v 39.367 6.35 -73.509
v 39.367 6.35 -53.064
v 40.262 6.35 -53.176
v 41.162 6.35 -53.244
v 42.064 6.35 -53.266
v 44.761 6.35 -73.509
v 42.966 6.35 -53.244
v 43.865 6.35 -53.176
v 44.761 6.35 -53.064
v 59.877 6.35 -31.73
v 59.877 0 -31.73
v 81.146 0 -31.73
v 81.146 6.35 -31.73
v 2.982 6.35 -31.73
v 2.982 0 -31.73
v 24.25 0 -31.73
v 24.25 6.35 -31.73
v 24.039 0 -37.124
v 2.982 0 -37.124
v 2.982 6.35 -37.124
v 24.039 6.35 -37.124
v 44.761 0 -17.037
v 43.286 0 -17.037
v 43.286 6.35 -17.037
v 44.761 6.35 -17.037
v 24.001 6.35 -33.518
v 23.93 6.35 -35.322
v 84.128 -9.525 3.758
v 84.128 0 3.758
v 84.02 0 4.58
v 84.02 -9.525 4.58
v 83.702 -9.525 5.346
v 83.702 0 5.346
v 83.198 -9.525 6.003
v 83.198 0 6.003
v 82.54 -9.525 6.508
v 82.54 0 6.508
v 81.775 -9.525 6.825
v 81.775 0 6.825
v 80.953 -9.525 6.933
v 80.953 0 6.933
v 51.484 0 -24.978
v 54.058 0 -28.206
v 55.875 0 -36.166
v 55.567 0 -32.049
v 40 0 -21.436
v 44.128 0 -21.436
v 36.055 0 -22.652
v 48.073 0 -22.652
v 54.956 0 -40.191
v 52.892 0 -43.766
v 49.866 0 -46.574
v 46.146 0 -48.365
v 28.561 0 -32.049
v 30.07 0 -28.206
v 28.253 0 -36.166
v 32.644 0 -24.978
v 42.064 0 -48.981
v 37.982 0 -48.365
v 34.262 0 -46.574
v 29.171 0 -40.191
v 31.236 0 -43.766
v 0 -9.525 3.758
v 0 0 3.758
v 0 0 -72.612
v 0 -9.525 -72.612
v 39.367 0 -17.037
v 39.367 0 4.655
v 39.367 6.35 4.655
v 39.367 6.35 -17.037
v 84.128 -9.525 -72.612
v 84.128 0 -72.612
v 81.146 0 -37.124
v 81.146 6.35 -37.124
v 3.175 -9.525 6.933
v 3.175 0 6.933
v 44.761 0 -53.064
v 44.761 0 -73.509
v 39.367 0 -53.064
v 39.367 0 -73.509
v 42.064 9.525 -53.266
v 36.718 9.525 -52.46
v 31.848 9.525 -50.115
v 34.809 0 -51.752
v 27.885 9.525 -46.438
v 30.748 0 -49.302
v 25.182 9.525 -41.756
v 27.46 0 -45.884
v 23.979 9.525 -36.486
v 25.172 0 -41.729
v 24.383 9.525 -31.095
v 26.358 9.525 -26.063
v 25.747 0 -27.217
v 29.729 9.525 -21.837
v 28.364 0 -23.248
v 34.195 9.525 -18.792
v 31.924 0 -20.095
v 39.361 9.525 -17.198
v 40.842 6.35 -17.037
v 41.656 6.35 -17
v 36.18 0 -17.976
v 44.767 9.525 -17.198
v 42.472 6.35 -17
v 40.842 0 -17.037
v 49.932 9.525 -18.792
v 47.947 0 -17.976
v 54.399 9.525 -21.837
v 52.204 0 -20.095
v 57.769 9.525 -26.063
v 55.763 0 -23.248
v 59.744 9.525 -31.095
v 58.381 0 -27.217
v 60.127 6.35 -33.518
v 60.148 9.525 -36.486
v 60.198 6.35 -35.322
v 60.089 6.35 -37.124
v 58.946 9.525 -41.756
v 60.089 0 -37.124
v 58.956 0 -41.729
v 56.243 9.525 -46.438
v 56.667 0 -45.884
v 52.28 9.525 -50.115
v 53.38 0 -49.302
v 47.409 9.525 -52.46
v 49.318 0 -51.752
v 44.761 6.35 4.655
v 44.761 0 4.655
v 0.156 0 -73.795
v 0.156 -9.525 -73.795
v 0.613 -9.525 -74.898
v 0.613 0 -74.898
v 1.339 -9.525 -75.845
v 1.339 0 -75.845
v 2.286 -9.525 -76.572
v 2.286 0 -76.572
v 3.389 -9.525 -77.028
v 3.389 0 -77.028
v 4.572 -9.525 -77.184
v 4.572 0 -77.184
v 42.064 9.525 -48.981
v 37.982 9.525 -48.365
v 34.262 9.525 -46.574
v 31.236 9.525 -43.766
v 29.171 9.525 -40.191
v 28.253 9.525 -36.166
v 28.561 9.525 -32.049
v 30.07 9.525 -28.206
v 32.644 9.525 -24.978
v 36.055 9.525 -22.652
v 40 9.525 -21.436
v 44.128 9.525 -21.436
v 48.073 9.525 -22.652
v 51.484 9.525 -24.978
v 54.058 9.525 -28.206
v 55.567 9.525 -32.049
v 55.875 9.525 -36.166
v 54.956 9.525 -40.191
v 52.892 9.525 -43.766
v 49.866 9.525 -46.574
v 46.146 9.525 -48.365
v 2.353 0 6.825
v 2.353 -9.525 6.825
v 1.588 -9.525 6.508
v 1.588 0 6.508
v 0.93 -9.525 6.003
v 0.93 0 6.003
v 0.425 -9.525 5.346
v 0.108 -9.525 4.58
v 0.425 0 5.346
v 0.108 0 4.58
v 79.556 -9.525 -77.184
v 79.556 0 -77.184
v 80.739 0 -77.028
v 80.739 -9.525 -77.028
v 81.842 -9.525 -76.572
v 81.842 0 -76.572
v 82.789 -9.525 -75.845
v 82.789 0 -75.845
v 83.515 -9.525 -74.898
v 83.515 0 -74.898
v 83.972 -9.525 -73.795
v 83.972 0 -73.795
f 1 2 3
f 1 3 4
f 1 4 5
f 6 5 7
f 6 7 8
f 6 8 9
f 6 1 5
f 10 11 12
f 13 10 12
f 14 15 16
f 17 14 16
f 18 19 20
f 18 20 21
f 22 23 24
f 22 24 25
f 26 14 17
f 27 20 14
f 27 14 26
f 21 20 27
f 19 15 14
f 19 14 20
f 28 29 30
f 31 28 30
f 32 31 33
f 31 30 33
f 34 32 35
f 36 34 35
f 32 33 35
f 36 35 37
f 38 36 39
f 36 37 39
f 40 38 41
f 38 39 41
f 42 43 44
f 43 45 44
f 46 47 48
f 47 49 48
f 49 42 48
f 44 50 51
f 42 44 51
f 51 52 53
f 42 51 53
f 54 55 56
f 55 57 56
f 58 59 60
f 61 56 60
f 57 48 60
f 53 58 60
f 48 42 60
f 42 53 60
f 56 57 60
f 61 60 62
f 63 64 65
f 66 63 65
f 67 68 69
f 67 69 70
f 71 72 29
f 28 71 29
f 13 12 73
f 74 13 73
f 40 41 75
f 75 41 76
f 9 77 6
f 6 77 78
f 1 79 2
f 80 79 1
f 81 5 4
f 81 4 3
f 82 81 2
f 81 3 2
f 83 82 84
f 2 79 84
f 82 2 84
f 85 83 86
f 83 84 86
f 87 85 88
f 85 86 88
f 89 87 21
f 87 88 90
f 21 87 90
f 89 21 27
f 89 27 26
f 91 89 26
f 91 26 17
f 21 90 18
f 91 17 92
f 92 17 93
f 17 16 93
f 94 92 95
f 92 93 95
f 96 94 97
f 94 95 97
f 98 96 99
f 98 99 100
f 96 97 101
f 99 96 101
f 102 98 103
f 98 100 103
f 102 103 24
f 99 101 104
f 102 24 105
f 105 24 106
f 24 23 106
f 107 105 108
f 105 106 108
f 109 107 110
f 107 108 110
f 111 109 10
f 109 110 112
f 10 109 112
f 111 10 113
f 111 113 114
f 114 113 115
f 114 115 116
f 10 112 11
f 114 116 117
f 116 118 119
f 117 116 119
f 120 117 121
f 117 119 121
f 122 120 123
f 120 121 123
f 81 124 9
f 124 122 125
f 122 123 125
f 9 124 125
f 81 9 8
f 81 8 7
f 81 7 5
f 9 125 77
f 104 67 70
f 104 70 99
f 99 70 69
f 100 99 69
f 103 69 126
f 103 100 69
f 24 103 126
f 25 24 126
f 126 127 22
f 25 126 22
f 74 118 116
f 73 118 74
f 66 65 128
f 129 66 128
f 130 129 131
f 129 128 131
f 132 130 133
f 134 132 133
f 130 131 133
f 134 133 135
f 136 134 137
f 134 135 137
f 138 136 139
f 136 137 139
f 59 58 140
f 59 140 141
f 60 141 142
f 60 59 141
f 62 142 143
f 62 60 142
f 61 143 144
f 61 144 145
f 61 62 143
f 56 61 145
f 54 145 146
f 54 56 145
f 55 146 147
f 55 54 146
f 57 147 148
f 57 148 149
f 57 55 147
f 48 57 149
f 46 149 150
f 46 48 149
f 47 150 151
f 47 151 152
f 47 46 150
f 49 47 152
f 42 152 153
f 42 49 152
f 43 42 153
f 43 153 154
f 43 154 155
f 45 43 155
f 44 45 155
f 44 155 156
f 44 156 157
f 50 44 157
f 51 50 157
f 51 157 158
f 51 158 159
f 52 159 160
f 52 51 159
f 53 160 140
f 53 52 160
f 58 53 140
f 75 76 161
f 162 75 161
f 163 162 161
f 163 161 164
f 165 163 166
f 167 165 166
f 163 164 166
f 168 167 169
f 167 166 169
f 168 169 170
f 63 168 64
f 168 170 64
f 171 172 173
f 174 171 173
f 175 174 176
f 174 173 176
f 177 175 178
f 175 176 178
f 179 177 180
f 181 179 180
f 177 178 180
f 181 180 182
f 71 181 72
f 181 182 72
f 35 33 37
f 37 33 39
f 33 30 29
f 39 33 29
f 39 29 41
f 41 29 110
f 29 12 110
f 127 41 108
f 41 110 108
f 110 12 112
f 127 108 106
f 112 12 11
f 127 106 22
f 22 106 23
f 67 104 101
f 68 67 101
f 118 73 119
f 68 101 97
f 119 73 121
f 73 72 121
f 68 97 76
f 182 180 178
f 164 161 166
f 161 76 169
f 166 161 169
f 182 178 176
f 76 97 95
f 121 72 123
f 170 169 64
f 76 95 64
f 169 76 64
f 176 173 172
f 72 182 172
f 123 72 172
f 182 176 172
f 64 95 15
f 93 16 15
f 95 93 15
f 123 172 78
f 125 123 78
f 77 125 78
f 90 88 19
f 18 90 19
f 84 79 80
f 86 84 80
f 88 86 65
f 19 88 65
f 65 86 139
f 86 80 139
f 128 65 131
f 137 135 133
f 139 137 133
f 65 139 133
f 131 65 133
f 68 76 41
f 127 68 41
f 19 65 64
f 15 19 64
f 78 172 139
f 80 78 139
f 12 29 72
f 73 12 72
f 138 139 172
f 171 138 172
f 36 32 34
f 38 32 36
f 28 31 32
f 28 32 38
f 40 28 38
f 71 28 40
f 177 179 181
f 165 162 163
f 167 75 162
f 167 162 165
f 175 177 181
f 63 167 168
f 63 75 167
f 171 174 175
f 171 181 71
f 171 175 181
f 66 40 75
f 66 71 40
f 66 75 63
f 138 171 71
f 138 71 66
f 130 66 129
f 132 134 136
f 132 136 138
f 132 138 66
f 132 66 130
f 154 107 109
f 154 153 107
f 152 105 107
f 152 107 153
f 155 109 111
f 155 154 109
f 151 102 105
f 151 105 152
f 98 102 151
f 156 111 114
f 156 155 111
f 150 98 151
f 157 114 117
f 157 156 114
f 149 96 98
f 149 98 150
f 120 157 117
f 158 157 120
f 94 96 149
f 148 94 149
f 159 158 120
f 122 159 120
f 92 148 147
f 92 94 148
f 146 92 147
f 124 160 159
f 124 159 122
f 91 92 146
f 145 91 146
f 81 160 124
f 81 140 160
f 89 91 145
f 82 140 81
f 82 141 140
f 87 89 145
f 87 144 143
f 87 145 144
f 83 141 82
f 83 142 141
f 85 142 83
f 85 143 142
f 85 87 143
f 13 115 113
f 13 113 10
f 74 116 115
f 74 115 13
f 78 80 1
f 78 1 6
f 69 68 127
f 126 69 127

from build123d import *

# Parameters (mm, degrees)
EXTRUDE1_DEPTH = 9.525
SKETCH2_R      = 18.135228151
SKETCH2_R_2    = 13.849910733
EXTRUDE2_DEPTH = 9.525
SKETCH5_W      = 21.692133904
SKETCH5_H      = 5.39360198
SKETCH5_W_2    = 5.39360198
SKETCH5_H_2    = 21.692133904
SKETCH5_W_3    = 21.692133903
EXTRUDE4_DEPTH = 6.35


with BuildPart() as part:
    # Sketch1 → Extrude1 (new body)
    with BuildSketch(Plane(origin=(0, 0, 0), x_dir=(1, 0, 0), z_dir=(0, 1, 0))):
        with BuildLine():
            Line((80.952795926, -6.933070377), (3.175, -6.933070377))
            ThreePointArc((3.175, -6.933070377), (0.92993597, -6.003134407), (0, -3.758070377))
            Line((0, -3.758070377), (0, 72.612142843))
            ThreePointArc((0, 72.612142843), (1.339107796, 75.845035046), (4.572, 77.184142843))
            Line((4.572, 77.184142843), (79.555795926, 77.184142843))
            ThreePointArc((79.555795926, 77.184142843), (82.78868813, 75.845035046), (84.127795926, 72.612142843))
            Line((84.127795926, 72.612142843), (84.127795926, -3.758070377))
            ThreePointArc((84.127795926, -3.758070377), (83.197859957, -6.003134407), (80.952795926, -6.933070377))
        make_face()
    extrude(amount=-EXTRUDE1_DEPTH)

    # Sketch2 → Extrude2 (add)
    with BuildSketch(Plane(origin=(0, 0, 0), x_dir=(1, 0, 0), z_dir=(0, 1, 0))):
        with Locations(Location((42.063897963, 35.130827586, 0), (0, 0, 90))):
            Circle(SKETCH2_R)
        with Locations(Location((42.063897963, 35.130827586, 0), (0, 0, 90))):
            Circle(SKETCH2_R_2, mode=Mode.SUBTRACT)
    extrude(amount=EXTRUDE2_DEPTH)

    # Sketch5 → Extrude4 (add)
    with BuildSketch(Plane(origin=(0, 0, 0), x_dir=(1, 0, 0), z_dir=(0, 1, 0))):
        with Locations((70.300158538, 34.427036233)):
            Rectangle(SKETCH5_W, SKETCH5_H)
        with Locations((42.063897963, 6.190775658)):
            Rectangle(SKETCH5_W_2, SKETCH5_H_2)
        with Locations((13.827637389, 34.427036233)):
            Rectangle(SKETCH5_W_3, SKETCH5_H)
        with Locations((42.063897963, 62.663296808)):
            Rectangle(SKETCH5_W_2, SKETCH5_H_2)
    extrude(amount=EXTRUDE4_DEPTH)


solid = part.part
